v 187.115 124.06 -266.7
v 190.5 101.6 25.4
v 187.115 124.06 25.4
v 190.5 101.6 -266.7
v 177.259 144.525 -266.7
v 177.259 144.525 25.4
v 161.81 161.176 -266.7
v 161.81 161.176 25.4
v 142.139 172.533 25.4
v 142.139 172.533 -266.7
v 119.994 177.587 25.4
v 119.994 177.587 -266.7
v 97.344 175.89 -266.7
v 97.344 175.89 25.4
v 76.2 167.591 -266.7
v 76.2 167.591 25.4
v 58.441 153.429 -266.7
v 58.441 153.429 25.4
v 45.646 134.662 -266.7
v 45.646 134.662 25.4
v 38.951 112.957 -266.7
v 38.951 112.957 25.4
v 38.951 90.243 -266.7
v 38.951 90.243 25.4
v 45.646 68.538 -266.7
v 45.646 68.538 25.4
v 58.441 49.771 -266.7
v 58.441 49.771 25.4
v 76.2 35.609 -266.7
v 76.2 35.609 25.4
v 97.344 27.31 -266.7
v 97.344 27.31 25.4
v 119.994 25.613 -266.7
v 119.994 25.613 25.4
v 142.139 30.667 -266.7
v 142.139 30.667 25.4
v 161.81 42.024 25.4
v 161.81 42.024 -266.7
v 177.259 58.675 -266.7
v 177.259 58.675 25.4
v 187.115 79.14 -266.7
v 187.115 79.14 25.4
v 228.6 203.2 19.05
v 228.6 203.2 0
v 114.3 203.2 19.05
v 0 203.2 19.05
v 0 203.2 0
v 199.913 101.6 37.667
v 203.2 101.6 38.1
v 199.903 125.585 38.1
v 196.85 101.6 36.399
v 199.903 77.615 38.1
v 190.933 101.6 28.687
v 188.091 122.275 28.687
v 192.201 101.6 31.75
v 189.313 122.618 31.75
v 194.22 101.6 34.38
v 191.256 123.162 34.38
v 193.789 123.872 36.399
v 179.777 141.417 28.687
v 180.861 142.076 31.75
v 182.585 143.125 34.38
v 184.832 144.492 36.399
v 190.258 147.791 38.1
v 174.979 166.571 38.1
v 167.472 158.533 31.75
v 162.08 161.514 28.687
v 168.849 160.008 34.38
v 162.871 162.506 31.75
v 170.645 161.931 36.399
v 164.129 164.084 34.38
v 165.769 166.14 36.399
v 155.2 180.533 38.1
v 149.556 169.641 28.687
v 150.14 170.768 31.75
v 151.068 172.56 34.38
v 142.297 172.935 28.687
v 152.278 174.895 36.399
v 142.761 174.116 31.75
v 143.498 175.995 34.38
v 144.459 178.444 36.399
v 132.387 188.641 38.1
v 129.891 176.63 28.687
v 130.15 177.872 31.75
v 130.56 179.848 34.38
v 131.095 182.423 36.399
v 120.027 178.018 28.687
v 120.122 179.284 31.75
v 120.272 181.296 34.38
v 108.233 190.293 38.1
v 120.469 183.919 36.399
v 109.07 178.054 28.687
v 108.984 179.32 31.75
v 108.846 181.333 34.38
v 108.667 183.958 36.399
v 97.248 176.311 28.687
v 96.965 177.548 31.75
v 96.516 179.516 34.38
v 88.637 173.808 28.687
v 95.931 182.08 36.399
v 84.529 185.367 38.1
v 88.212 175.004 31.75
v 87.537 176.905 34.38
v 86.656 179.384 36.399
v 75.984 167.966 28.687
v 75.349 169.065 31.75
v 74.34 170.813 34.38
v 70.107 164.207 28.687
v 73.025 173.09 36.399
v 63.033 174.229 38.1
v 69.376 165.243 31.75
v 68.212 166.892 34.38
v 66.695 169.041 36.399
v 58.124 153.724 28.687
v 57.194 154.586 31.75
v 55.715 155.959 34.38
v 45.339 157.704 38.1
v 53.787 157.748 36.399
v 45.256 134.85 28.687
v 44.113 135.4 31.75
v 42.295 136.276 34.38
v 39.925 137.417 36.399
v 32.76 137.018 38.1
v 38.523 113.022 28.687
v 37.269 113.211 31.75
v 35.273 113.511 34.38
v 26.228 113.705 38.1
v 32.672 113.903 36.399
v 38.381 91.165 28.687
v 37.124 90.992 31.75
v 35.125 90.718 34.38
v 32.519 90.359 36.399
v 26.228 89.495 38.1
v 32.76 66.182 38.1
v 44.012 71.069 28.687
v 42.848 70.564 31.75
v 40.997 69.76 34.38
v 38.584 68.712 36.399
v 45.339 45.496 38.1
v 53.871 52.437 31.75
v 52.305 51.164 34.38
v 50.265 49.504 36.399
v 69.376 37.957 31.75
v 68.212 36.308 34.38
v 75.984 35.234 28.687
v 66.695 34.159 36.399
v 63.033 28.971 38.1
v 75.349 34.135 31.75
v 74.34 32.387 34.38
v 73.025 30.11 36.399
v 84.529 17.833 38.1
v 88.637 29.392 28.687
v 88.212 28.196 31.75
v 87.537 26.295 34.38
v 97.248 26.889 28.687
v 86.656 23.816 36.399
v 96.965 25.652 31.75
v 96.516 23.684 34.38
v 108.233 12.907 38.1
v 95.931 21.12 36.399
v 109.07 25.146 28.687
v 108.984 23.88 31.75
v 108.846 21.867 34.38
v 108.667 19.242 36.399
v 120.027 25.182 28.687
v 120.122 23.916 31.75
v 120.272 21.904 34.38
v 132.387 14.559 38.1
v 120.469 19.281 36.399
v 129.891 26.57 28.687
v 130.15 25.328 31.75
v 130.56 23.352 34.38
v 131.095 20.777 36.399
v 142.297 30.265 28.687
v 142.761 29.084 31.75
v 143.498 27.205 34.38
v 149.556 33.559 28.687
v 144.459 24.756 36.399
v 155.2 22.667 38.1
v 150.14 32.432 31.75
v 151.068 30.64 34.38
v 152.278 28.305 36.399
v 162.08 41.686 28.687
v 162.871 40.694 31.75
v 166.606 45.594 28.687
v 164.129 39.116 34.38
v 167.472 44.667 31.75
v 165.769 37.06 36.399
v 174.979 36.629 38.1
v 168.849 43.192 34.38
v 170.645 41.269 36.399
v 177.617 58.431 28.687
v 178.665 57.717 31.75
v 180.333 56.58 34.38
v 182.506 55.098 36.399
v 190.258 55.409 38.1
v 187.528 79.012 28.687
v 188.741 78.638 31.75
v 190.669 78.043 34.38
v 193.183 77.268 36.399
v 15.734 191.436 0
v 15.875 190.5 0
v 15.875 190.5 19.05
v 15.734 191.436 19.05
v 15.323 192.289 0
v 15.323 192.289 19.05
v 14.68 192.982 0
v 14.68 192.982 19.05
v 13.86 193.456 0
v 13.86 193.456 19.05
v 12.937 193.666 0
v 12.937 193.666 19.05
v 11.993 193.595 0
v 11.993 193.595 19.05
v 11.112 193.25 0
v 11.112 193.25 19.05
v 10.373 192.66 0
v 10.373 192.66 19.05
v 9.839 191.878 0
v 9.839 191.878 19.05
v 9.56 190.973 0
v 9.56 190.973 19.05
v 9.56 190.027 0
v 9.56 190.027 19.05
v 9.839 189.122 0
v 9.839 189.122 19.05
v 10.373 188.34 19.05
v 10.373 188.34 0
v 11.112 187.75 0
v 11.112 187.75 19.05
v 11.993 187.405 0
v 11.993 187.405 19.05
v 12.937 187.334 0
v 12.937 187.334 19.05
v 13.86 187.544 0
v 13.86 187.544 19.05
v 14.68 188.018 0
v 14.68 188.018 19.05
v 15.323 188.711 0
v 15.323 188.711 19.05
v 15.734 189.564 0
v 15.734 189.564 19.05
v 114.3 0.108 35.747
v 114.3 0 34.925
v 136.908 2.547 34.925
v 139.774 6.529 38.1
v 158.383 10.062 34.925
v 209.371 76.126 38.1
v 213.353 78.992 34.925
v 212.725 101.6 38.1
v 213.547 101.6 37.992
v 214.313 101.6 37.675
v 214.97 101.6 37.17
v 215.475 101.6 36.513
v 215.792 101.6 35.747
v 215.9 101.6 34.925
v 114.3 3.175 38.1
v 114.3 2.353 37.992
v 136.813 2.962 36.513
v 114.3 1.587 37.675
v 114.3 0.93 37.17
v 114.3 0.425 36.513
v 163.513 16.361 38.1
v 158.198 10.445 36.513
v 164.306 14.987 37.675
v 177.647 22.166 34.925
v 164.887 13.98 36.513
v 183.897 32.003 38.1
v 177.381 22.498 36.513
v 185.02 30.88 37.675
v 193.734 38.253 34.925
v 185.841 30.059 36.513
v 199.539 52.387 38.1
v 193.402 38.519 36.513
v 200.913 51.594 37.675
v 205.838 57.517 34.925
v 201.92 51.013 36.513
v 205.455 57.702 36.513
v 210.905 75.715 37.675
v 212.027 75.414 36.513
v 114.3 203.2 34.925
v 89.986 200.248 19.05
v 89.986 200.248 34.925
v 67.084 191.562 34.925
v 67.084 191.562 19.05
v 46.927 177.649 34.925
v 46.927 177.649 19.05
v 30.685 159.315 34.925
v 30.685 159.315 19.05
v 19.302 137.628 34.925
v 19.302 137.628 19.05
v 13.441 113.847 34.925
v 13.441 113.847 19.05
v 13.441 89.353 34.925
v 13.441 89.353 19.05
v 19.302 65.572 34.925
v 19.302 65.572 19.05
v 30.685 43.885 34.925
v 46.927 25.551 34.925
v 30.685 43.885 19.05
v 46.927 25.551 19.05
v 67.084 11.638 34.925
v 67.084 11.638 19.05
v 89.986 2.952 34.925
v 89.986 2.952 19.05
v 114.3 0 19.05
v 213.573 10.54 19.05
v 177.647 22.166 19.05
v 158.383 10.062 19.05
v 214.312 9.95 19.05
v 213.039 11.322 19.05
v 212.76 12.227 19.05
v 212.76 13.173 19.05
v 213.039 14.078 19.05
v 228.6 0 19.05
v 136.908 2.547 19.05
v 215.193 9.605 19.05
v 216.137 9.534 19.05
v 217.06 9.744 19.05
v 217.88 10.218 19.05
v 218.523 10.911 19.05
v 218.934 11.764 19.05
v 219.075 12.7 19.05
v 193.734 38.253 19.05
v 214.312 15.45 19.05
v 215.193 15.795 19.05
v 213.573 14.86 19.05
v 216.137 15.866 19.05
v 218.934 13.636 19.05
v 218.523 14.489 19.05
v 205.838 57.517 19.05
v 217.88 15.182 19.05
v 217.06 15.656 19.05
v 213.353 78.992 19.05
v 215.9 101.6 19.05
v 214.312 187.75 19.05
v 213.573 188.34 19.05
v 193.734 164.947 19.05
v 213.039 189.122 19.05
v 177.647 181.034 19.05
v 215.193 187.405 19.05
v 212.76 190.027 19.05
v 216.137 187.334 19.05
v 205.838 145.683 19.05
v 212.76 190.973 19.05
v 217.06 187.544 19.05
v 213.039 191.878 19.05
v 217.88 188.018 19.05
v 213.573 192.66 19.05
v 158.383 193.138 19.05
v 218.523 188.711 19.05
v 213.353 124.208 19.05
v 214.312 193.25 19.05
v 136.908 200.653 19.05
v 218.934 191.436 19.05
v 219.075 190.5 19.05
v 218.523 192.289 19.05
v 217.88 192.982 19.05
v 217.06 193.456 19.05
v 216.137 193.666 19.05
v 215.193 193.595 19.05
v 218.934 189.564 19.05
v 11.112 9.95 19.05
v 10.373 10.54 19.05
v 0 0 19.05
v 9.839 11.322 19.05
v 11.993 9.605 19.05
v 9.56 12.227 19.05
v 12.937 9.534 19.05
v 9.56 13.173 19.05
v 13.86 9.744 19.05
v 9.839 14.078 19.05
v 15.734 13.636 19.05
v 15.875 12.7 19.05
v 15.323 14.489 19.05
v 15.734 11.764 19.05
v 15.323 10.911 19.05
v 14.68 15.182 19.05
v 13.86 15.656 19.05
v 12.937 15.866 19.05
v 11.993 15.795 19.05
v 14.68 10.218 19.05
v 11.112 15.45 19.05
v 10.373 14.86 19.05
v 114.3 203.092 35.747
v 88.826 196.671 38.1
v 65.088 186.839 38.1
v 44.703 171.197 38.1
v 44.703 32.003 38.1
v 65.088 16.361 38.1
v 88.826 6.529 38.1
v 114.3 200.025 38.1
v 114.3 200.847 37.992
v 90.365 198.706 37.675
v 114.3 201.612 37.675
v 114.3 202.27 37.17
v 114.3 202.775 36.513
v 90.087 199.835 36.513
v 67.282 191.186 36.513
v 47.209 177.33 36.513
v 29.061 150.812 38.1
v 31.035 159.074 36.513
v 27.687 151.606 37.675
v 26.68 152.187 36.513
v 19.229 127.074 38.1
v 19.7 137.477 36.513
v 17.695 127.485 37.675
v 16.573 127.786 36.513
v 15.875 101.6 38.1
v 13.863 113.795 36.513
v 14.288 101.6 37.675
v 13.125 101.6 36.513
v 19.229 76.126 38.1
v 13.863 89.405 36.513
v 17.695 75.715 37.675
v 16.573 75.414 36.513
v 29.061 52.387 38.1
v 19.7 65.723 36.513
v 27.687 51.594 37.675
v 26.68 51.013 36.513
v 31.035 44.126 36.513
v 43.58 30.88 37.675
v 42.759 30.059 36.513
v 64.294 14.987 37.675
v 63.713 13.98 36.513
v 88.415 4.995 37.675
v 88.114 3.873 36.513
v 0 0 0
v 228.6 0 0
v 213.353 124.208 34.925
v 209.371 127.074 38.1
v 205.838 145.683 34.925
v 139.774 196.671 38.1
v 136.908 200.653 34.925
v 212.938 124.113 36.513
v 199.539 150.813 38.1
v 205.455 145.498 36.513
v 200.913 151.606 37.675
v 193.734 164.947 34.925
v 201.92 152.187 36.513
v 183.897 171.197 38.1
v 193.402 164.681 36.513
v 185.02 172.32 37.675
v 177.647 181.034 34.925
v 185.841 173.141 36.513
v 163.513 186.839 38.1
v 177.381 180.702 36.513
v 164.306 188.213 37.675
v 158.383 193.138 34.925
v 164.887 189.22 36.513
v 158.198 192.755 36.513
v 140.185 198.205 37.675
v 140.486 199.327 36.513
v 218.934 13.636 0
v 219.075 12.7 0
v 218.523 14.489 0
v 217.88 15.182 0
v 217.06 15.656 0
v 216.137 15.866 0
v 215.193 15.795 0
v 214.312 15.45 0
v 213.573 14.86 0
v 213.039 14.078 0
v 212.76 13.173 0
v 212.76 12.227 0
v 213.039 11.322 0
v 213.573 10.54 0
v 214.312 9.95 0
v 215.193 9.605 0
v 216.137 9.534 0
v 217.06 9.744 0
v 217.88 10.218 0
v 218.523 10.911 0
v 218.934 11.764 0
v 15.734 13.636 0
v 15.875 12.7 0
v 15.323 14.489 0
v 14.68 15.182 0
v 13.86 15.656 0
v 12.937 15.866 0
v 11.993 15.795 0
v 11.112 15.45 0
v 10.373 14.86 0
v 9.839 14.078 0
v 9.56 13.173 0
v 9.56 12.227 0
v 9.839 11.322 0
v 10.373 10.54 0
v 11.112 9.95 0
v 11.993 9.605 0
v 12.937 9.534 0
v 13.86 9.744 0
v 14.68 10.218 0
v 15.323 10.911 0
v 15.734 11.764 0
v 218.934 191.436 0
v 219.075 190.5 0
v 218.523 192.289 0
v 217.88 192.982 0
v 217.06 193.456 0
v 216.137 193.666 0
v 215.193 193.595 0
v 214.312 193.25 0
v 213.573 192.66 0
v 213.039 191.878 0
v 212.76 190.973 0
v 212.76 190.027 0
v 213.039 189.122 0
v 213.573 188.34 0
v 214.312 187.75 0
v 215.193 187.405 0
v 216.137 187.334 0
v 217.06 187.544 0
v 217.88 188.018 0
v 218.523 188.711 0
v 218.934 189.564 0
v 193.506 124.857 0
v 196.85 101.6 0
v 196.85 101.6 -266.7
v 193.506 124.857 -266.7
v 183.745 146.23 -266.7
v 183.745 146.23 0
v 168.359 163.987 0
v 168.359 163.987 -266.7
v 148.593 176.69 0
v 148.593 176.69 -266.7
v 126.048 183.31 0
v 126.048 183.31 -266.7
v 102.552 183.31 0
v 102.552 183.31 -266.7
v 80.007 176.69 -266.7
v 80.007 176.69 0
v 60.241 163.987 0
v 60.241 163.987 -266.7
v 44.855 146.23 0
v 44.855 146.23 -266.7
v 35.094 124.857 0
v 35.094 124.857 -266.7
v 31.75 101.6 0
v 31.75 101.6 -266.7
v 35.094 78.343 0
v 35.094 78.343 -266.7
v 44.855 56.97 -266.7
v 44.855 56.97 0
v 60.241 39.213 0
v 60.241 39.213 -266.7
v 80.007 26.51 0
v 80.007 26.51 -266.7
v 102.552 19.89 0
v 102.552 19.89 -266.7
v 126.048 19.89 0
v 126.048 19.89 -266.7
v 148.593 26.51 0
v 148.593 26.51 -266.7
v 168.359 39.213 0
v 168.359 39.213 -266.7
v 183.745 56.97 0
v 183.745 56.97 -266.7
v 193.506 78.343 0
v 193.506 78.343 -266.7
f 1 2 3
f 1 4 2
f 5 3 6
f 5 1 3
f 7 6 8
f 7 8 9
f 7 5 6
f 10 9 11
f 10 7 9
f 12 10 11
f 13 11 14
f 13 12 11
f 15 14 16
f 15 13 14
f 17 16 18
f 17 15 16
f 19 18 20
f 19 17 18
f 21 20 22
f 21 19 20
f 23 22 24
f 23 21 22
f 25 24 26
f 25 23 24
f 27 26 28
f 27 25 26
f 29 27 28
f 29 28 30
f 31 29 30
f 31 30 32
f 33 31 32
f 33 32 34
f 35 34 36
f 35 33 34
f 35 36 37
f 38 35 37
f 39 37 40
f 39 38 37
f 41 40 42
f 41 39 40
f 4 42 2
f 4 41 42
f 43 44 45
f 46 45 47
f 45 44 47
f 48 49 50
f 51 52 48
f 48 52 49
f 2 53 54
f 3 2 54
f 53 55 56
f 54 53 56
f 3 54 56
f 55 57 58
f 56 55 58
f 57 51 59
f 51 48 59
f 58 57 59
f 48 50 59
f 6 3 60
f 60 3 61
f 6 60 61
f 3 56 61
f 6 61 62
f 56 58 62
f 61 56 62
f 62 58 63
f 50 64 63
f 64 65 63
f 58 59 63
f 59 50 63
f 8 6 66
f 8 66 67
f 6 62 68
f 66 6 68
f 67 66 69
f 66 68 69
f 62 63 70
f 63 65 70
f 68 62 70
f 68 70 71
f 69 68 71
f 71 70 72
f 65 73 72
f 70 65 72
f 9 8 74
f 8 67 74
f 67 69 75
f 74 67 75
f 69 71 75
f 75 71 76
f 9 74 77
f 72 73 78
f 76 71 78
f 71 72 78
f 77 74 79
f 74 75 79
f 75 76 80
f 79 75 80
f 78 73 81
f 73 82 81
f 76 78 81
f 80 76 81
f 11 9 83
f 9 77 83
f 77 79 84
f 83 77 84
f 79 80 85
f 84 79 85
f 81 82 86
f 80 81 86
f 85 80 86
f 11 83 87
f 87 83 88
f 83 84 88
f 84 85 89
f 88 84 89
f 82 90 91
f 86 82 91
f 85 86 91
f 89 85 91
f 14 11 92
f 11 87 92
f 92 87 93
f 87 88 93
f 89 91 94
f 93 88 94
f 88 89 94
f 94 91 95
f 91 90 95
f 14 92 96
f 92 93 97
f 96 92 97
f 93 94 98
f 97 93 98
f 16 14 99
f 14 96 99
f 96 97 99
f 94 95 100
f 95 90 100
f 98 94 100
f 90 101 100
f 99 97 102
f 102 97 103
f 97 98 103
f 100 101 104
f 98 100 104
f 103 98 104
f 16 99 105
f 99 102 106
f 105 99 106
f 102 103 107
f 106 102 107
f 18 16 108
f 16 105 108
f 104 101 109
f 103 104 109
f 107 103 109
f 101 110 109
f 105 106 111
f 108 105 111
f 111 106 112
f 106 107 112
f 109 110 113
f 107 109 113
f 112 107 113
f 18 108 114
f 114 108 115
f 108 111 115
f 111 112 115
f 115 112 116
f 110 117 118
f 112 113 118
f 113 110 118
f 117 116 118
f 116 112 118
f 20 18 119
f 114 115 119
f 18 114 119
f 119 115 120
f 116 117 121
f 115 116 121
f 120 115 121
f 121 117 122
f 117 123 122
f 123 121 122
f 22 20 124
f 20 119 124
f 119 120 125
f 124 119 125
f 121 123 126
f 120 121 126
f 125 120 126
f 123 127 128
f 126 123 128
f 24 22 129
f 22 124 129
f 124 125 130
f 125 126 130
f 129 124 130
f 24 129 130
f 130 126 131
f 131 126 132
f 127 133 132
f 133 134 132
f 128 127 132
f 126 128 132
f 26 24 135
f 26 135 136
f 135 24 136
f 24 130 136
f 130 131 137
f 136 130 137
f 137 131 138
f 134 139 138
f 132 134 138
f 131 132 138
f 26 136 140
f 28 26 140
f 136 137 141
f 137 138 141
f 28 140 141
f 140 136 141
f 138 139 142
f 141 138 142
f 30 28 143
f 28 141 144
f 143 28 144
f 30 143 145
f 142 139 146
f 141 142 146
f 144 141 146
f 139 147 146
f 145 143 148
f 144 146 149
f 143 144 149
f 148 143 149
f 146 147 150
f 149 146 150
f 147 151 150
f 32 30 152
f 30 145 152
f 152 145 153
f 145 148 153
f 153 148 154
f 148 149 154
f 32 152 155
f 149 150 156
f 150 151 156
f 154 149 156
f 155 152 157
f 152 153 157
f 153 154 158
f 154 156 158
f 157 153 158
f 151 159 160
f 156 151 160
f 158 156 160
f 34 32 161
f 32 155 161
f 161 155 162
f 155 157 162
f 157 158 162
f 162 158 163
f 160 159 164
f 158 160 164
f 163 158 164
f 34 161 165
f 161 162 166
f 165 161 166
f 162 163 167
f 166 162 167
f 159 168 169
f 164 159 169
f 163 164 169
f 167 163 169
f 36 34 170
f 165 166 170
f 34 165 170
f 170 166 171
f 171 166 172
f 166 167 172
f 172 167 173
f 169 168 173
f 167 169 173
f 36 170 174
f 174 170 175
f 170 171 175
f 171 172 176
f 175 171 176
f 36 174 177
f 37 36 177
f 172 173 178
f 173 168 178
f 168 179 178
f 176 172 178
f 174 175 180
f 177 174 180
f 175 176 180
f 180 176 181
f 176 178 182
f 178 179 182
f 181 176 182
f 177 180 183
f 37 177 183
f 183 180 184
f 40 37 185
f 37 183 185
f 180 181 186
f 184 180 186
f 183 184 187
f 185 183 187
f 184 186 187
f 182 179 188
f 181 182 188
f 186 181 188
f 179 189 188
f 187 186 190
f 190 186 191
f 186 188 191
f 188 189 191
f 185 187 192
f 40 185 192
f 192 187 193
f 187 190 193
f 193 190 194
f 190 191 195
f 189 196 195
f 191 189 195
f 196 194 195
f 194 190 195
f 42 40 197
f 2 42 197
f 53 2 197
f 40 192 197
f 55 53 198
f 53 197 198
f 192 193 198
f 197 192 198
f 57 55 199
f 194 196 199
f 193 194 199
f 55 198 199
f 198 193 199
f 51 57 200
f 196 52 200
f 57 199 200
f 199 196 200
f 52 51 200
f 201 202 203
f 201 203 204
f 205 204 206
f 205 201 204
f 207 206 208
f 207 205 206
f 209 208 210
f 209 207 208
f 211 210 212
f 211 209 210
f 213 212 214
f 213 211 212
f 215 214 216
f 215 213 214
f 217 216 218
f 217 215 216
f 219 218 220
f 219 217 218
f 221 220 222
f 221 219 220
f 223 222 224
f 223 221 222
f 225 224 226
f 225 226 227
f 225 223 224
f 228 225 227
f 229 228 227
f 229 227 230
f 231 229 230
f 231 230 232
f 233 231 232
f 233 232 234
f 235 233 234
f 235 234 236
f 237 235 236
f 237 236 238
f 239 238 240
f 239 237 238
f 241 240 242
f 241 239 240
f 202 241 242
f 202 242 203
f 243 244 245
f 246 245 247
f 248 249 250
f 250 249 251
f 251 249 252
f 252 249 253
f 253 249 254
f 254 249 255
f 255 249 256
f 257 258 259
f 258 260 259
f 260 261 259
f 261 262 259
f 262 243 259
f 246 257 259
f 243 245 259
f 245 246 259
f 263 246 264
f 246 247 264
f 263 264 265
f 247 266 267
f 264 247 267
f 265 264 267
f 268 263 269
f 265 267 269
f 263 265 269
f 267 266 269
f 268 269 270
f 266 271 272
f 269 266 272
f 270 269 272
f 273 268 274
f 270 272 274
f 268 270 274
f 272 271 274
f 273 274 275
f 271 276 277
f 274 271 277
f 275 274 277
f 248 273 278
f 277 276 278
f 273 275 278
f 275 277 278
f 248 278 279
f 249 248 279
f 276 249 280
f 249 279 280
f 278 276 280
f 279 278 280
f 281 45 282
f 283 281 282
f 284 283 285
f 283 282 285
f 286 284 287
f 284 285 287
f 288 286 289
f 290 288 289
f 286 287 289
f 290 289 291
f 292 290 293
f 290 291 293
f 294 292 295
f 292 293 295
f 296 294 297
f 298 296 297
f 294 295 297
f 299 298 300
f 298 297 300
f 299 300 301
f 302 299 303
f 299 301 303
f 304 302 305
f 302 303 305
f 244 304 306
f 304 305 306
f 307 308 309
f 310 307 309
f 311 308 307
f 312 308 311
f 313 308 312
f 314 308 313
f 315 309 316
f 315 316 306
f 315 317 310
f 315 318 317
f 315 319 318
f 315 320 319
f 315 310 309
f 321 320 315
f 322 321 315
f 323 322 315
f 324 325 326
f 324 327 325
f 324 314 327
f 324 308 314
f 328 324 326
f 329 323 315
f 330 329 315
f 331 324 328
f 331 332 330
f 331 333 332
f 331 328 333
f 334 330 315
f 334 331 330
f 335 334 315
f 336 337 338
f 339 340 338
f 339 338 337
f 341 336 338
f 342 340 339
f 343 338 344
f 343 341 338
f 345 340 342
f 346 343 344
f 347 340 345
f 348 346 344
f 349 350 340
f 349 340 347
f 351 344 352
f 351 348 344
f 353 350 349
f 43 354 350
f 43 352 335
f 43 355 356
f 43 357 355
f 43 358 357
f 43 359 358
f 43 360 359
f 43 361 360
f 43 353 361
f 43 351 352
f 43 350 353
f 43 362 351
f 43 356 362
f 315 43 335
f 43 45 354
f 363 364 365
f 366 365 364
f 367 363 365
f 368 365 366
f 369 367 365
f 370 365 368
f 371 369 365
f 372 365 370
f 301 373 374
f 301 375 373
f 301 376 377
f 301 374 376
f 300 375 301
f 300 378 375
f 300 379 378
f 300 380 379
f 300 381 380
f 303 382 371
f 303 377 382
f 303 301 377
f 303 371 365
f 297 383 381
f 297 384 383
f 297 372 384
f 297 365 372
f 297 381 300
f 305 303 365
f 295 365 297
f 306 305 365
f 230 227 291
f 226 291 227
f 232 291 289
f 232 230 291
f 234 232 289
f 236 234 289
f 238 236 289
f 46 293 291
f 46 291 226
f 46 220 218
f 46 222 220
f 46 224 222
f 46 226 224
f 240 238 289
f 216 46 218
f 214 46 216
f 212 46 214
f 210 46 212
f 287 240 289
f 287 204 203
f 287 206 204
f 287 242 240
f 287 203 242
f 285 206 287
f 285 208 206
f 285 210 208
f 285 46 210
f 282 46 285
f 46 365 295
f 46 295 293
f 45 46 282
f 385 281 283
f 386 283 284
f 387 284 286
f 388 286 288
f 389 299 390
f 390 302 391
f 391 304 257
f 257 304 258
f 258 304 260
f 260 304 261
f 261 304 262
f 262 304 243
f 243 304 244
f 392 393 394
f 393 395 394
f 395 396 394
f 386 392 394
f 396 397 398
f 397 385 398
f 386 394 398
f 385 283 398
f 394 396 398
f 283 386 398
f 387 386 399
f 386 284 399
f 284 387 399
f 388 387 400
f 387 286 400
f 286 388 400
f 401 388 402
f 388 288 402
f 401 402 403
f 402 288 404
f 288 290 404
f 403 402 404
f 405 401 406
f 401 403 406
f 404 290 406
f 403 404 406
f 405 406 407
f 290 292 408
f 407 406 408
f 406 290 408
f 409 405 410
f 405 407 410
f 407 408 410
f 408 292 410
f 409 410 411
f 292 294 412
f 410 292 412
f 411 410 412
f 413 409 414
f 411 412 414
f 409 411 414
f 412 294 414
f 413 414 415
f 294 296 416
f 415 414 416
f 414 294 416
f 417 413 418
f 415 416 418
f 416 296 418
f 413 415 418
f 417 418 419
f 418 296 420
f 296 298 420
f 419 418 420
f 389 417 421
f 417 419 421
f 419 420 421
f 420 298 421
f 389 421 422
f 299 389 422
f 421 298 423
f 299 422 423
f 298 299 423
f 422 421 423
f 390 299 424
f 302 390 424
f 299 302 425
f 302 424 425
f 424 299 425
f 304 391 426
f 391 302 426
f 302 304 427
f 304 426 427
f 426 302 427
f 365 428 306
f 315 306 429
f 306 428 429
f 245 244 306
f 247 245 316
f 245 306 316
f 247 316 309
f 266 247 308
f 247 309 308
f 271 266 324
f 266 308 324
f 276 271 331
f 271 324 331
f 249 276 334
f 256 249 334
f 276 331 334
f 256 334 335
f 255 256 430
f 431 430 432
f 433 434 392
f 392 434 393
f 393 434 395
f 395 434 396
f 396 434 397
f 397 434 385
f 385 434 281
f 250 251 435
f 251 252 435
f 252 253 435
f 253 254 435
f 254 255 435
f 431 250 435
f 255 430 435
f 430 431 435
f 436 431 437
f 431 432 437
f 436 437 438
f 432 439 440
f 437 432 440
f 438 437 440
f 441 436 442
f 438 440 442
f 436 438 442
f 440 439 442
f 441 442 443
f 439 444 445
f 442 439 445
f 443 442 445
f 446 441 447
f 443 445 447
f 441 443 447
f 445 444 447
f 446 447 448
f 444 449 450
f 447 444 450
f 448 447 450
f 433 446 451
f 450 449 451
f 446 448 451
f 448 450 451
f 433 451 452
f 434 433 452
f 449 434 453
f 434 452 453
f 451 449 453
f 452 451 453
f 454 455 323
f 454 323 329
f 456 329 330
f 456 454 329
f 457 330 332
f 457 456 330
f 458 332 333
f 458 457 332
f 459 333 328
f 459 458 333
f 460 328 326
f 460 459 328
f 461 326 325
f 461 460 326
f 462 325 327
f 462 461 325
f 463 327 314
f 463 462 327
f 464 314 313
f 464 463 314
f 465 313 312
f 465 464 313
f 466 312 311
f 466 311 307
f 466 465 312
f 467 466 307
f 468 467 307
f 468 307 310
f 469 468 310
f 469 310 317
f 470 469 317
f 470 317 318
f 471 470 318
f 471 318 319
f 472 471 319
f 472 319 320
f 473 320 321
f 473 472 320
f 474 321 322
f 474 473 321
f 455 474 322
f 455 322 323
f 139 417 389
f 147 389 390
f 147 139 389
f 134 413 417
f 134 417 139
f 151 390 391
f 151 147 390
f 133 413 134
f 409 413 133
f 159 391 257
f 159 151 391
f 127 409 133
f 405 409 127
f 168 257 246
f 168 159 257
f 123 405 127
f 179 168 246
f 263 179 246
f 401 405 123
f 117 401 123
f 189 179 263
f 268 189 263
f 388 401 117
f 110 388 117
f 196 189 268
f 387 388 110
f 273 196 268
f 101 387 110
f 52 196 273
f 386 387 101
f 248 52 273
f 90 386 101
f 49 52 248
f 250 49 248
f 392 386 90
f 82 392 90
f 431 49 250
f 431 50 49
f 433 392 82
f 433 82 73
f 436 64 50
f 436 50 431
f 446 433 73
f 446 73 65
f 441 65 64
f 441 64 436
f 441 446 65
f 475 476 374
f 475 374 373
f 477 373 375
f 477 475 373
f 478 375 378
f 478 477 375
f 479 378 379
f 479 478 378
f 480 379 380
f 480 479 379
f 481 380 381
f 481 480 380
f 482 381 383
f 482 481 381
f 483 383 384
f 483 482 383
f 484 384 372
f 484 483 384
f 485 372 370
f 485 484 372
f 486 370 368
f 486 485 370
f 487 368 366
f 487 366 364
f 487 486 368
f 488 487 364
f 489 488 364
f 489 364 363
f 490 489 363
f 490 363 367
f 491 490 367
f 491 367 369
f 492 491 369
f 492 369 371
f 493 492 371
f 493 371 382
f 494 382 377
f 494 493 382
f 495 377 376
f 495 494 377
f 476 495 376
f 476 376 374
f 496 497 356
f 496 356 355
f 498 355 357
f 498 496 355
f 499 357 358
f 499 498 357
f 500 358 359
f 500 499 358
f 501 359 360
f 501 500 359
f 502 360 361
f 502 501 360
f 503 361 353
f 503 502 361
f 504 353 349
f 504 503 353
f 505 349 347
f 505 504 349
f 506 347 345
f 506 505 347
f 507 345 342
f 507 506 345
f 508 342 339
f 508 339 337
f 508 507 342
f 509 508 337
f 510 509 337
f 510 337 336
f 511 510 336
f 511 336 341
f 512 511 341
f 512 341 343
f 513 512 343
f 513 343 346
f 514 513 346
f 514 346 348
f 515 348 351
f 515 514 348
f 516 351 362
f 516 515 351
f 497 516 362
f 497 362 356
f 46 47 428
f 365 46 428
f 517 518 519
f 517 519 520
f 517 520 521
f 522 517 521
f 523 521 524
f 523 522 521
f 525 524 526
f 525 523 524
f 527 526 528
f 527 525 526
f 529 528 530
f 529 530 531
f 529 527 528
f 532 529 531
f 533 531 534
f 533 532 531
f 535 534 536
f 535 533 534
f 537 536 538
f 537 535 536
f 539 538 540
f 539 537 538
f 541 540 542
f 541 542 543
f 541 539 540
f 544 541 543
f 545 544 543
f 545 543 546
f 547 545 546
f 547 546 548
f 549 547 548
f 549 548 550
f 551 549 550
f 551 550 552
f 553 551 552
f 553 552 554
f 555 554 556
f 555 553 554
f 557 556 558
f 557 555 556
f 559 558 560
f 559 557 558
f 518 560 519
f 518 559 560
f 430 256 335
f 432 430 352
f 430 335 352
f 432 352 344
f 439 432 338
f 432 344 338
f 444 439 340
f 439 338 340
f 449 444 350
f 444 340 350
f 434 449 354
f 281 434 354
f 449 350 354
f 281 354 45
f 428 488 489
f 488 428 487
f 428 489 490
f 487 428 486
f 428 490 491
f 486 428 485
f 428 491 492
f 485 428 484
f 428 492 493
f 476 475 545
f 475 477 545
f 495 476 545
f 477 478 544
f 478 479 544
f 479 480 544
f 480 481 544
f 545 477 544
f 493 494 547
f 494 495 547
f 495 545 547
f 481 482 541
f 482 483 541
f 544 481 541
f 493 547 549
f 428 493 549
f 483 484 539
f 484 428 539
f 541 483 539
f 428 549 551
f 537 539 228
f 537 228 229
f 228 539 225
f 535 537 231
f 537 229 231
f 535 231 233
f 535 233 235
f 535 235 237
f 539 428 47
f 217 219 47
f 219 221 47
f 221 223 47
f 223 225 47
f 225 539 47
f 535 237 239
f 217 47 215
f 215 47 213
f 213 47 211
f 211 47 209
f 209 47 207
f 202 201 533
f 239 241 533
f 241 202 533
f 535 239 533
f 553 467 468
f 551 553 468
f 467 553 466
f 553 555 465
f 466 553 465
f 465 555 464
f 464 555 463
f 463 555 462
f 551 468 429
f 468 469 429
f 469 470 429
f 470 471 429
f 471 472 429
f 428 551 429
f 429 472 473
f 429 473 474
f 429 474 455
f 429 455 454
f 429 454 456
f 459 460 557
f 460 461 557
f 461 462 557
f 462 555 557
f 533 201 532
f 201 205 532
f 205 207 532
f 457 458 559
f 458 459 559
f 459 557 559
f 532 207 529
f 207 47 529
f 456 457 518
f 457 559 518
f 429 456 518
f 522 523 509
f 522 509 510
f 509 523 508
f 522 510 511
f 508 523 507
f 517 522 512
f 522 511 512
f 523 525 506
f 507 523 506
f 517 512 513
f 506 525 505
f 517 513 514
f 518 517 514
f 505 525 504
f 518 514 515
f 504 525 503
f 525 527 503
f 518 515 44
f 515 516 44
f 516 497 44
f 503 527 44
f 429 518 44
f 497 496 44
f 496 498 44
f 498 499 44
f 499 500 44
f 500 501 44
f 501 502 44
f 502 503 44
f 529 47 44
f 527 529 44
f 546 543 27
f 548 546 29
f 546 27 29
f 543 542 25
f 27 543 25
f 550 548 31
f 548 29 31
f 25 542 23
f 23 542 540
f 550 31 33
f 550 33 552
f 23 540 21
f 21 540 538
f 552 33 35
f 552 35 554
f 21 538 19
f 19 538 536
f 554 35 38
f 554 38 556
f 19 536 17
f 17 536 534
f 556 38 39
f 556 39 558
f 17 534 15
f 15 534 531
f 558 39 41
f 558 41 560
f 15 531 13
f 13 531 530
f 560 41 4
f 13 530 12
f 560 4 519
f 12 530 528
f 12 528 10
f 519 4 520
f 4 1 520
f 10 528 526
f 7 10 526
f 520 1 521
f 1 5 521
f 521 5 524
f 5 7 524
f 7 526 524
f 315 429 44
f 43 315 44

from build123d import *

# Parameters (mm, degrees)
F0_R     = 3.175
F1_DEPTH = 19.05
F0_R_2   = 82.55
F0_R_3   = 76.2
F2_DEPTH = 38.1
F3_DEPTH = 266.7
F4_R     = 12.7
F5_R     = 3.175


with BuildPart() as f1:
    # F0 (on Top) → F1 (new body)
    with BuildSketch(Plane.XY):
        with BuildLine():
            Line((0, 203.2), (0, 0))
            Line((0, 0), (114.3, 0))
            ThreePointArc((114.3, 0), (12.7, 101.6), (114.3, 203.2))
            Line((114.3, 203.2), (0, 203.2))
        make_face()
        with Locations((12.7, 12.7)):
            Circle(F0_R, mode=Mode.SUBTRACT)
        with Locations((12.7, 190.5)):
            Circle(F0_R, mode=Mode.SUBTRACT)
    extrude(amount=F1_DEPTH)



with BuildPart() as f1b:
    # F0 (on Top) → F1, piece 2 (new body)
    with BuildSketch(Plane.XY):
        with BuildLine():
            ThreePointArc((215.9, 101.6), (186.1420489686, 29.7579510314), (114.3, 0))
            Line((114.3, 0), (228.6, 0))
            Line((228.6, 0), (228.6, 203.2))
            Line((228.6, 203.2), (114.3, 203.2))
            ThreePointArc((114.3, 203.2), (186.1420489686, 173.4420489686), (215.9, 101.6))
        make_face()
        with Locations((215.9, 12.7)):
            Circle(F0_R, mode=Mode.SUBTRACT)
        with Locations((215.9, 190.5)):
            Circle(F0_R, mode=Mode.SUBTRACT)
    extrude(amount=F1_DEPTH)


with BuildPart() as f1_1:
    add(f1.part)

    add(f1b.part)  # F2 merges F1b
    # F0 (on Top) → F2 (join)
    with BuildSketch(Plane.XY):
        with BuildLine():
            ThreePointArc((114.3, 203.2), (12.7, 101.6), (114.3, 0))
            ThreePointArc((114.3, 0), (186.1420489686, 29.7579510314), (215.9, 101.6))
            ThreePointArc((215.9, 101.6), (186.1420489686, 173.4420489686), (114.3, 203.2))
        make_face()
        with Locations((114.3, 101.6)):
            Circle(F0_R_2, mode=Mode.SUBTRACT)
        with Locations((114.3, 101.6)):
            Circle(F0_R_2)
        with Locations((114.3, 101.6)):
            Circle(F0_R_3, mode=Mode.SUBTRACT)
    extrude(amount=F2_DEPTH)

    # F0 (on Top) → F3 (join)
    with BuildSketch(Plane.XY):
        with Locations((114.3, 101.6)):
            Circle(F0_R_2)
        with Locations((114.3, 101.6)):
            Circle(F0_R_3, mode=Mode.SUBTRACT)
    extrude(amount=-F3_DEPTH)

    # F4
    f4_edges = [f1_1.edges().sort_by_distance(p)[0] for p in [
        (38.1, 101.6, 38.1),
    ]]
    fillet(f4_edges, radius=F4_R)

    # F5
    f5_edges = [f1_1.edges().sort_by_distance(p)[0] for p in [
        (114.3, 0, 38.1),
    ]]
    fillet(f5_edges, radius=F5_R)


solid = f1_1.part
